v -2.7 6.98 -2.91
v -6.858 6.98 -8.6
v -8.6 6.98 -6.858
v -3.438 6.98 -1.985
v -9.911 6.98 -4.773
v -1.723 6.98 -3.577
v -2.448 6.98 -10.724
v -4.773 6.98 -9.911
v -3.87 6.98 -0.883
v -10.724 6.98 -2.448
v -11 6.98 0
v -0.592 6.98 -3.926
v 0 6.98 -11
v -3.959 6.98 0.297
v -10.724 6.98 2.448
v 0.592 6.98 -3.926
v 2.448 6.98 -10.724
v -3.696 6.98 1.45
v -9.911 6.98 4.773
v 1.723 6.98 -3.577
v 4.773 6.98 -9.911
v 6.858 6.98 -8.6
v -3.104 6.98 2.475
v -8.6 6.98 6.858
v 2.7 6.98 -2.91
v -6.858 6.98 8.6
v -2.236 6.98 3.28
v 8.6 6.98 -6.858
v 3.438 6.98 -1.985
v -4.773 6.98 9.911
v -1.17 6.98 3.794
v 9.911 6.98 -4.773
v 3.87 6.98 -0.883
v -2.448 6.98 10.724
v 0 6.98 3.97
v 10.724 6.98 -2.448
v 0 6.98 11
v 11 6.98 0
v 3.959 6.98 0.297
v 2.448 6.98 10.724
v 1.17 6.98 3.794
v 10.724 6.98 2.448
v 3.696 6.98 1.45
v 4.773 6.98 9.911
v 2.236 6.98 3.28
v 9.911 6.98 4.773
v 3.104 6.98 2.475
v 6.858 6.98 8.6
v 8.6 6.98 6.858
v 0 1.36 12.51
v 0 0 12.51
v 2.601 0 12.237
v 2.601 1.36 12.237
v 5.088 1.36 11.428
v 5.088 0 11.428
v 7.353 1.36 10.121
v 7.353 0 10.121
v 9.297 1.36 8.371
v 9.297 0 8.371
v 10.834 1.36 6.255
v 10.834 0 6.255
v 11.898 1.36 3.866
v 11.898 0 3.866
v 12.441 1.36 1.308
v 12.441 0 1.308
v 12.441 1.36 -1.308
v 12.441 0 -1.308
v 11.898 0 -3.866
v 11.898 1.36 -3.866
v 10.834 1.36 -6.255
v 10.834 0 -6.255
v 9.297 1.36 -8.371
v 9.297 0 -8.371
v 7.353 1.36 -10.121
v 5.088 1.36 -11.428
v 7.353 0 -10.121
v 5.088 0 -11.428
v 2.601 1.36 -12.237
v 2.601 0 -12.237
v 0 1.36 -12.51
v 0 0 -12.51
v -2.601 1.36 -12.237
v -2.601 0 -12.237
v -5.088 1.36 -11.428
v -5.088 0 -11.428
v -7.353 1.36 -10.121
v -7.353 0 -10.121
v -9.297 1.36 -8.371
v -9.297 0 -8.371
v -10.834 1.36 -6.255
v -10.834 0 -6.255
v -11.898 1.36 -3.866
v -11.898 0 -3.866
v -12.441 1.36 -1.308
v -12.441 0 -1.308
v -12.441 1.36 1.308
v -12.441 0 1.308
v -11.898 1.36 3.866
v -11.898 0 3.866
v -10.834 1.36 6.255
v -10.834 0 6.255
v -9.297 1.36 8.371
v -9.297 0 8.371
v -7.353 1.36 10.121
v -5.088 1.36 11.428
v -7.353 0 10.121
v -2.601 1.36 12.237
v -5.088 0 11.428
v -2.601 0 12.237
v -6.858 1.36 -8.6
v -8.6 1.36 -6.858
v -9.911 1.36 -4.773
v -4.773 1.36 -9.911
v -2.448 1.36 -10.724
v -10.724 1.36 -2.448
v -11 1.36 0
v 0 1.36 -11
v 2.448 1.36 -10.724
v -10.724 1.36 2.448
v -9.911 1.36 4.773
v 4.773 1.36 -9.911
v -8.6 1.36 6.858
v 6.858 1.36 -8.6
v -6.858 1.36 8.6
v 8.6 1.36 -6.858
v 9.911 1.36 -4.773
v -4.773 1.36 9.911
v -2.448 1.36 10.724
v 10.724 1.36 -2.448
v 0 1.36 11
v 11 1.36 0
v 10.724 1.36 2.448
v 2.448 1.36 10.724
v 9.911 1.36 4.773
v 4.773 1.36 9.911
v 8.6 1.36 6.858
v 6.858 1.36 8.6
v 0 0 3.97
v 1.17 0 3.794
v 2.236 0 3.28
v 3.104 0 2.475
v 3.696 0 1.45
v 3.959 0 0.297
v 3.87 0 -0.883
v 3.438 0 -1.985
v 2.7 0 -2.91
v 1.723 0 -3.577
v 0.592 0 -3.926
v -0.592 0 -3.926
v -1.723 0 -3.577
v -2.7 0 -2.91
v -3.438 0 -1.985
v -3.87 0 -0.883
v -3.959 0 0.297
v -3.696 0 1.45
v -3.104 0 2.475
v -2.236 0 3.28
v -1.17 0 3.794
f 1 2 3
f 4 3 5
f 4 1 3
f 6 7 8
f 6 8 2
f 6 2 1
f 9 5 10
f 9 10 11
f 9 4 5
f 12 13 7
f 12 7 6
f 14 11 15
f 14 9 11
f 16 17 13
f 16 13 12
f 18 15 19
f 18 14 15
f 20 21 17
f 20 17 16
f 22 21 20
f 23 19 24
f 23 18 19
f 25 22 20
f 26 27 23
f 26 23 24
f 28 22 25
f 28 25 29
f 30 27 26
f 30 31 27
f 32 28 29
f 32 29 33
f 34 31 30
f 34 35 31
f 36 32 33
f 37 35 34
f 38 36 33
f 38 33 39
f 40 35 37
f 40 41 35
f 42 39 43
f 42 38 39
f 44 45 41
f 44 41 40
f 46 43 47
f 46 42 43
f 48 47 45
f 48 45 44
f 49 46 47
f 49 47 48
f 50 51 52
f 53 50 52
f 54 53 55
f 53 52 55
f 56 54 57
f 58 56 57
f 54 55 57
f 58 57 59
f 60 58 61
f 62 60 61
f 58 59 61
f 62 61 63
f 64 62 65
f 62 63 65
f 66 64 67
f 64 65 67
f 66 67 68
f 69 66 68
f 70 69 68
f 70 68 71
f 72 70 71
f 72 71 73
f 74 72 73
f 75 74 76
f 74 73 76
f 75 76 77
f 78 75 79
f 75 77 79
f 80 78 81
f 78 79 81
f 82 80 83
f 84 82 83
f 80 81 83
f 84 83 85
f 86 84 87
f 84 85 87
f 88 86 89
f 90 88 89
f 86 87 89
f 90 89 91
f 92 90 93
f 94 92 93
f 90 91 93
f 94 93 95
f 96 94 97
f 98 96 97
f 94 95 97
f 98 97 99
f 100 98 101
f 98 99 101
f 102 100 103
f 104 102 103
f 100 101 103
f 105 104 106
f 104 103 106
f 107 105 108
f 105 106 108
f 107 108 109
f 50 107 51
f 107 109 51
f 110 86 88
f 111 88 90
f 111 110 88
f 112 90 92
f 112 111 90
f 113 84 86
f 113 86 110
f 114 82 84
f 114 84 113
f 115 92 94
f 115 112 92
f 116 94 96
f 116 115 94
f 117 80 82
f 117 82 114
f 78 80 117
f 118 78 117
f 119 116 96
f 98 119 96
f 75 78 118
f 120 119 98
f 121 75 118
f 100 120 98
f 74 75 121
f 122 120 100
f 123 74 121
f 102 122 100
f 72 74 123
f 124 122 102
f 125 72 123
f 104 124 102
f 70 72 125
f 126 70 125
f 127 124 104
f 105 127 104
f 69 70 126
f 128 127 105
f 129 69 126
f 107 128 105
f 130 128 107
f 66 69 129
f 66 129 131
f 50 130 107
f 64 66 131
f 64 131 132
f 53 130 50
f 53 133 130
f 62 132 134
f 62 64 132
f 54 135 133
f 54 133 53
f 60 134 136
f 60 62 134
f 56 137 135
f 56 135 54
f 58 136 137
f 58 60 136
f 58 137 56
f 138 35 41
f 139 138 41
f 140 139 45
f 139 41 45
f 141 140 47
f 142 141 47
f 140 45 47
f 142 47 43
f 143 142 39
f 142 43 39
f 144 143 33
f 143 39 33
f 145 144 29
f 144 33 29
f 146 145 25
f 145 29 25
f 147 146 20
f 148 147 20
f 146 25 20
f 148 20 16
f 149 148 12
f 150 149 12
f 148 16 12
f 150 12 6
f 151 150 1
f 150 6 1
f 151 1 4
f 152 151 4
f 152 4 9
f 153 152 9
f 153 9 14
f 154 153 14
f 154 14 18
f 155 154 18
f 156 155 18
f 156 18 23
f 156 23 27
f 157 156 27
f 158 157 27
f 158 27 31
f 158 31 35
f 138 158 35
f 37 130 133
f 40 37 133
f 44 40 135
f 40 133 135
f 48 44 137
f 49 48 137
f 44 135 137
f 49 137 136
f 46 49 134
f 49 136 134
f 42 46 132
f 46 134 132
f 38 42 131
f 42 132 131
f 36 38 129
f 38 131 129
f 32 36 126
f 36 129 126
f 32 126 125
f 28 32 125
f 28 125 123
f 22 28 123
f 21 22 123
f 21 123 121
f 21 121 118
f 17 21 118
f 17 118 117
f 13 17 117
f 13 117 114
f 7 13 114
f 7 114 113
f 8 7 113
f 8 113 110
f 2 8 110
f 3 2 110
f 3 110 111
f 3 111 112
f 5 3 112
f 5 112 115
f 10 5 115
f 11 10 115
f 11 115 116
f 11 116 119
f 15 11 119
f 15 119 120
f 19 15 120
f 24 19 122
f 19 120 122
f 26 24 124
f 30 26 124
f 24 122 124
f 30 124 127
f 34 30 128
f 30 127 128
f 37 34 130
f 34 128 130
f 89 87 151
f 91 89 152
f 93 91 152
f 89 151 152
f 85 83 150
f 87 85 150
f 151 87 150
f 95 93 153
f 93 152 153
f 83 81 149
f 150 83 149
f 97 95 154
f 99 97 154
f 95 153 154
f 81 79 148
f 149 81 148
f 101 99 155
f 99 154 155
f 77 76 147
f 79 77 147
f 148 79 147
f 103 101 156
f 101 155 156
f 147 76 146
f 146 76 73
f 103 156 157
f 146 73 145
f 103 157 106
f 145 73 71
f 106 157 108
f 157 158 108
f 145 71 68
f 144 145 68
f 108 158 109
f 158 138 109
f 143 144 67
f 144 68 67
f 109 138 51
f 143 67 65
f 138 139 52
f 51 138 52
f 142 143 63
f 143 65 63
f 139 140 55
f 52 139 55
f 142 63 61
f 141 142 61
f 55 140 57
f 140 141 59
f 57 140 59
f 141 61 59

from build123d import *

# Parameters (mm, degrees)
SKETCH1_R           = 12.51
BOSS_EXTRUDE1_DEPTH = 1.36
BOSS_EXTRUDE2_START = -1.36
SKETCH2_R           = 11
BOSS_EXTRUDE2_DEPTH = 6.98
SKETCH3_R           = 3.97
CUT_EXTRUDE1_DEPTH  = 20.018953704


with BuildPart() as part:
    # Sketch1 → Boss-Extrude1 (new body)
    with BuildSketch(Plane(origin=(0, 0, 0), x_dir=(1, 0, 0), z_dir=(0, 1, 0))):
        with Locations(Location((0, 0, 0), (0, 0, 270))):
            Circle(SKETCH1_R)
    extrude(amount=BOSS_EXTRUDE1_DEPTH)

    # Sketch2 → Boss-Extrude2 (add)
    with BuildSketch(Plane(origin=(0, 1.36, 0), x_dir=(1, 0, 0), z_dir=(0, 1, 0)).offset(BOSS_EXTRUDE2_START)):
        with Locations(Location((0, 0, 0), (0, 0, 270))):
            Circle(SKETCH2_R)
    extrude(amount=BOSS_EXTRUDE2_DEPTH)

    # Sketch3 → Cut-Extrude1 (cut, through all)
    with BuildSketch(Plane(origin=(0, 6.98, 0), x_dir=(1, 0, 0), z_dir=(0, 1, 0))):
        with Locations(Location((0, 0, 0), (0, 0, 270))):
            Circle(SKETCH3_R)
    extrude(amount=-CUT_EXTRUDE1_DEPTH, mode=Mode.SUBTRACT)


solid = part.part
